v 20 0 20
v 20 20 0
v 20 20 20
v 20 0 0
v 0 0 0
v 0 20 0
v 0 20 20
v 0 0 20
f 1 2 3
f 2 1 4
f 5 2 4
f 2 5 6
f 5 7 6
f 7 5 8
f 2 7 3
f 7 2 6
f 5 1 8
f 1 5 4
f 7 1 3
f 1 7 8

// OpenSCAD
// The guard against under-merging: two cubes stacked flush. The shared face is
// coplanar, so the union must not draw a seam across it.
union() {
  cube([20, 20, 10]);
  translate([0, 0, 10]) cube([20, 20, 10]);
}
